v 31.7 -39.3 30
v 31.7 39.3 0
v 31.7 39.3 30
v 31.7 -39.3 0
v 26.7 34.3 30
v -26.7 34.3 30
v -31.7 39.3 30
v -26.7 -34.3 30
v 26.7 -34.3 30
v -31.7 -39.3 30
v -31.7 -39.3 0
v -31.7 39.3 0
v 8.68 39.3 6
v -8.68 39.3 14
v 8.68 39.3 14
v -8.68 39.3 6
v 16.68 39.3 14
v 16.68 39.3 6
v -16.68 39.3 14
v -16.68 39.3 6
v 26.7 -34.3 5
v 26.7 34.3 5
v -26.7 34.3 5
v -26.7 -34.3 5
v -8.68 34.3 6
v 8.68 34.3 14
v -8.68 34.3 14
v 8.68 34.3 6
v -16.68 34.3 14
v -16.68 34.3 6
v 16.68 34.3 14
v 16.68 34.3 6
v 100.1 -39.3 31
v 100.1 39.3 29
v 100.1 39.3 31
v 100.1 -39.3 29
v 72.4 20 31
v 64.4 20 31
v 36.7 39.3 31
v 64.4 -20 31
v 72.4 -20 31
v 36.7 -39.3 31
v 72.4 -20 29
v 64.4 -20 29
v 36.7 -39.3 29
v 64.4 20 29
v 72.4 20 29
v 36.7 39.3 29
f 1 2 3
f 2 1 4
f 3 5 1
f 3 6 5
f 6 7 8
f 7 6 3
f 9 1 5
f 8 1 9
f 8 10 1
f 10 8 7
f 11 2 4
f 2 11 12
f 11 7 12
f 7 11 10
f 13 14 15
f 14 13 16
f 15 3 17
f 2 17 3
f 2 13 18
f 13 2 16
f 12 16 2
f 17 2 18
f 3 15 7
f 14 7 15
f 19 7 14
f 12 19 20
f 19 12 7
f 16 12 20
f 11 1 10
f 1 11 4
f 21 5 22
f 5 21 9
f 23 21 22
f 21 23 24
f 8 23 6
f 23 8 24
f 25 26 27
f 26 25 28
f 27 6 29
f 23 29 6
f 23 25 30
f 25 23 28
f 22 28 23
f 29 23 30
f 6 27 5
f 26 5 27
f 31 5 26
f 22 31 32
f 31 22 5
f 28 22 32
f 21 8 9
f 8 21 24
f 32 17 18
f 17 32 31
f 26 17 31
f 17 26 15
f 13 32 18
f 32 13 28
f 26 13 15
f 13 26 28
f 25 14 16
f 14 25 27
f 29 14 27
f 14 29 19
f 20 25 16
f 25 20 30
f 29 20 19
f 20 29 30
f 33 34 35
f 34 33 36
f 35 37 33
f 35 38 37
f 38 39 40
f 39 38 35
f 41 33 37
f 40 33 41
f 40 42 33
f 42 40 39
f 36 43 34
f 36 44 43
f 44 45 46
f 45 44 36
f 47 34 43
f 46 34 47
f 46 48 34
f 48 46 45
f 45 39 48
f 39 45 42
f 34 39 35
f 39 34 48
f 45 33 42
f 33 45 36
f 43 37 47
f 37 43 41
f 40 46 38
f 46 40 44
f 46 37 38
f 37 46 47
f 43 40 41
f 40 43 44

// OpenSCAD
x_caja = 53.4+10;
y_caja = 68.6+10;
z_caja = 30;

x_cables = 8;
y_cables = 30;
z_cables = x_cables;

x_superior = 8;
y_superior = 40;
z_superior = x_superior;

separcion_caja_tapa =5;

 difference(){
    translate([0,0,30/2])
        cube ([x_caja,y_caja,z_caja], center = true);
     translate([0,0,30/2+5])
        cube ([x_caja-10,y_caja-10,z_caja], center = true);
     translate([x_caja/5,y_caja/2,z_caja/2-5])
        cube ([x_cables,y_cables,z_cables], center = true);
     translate([-x_caja/5,y_caja/2,z_caja/2-5])
        cube ([x_cables,y_cables,z_cables], center = true);
 }
 
 difference(){
    translate([x_caja+separcion_caja_tapa,0,z_caja])
        cube ([x_caja,y_caja,2], center = true);
     translate([x_caja+separcion_caja_tapa,0,z_caja+2])
        cube ([x_superior,y_superior,z_superior], center = true);
 }
  
